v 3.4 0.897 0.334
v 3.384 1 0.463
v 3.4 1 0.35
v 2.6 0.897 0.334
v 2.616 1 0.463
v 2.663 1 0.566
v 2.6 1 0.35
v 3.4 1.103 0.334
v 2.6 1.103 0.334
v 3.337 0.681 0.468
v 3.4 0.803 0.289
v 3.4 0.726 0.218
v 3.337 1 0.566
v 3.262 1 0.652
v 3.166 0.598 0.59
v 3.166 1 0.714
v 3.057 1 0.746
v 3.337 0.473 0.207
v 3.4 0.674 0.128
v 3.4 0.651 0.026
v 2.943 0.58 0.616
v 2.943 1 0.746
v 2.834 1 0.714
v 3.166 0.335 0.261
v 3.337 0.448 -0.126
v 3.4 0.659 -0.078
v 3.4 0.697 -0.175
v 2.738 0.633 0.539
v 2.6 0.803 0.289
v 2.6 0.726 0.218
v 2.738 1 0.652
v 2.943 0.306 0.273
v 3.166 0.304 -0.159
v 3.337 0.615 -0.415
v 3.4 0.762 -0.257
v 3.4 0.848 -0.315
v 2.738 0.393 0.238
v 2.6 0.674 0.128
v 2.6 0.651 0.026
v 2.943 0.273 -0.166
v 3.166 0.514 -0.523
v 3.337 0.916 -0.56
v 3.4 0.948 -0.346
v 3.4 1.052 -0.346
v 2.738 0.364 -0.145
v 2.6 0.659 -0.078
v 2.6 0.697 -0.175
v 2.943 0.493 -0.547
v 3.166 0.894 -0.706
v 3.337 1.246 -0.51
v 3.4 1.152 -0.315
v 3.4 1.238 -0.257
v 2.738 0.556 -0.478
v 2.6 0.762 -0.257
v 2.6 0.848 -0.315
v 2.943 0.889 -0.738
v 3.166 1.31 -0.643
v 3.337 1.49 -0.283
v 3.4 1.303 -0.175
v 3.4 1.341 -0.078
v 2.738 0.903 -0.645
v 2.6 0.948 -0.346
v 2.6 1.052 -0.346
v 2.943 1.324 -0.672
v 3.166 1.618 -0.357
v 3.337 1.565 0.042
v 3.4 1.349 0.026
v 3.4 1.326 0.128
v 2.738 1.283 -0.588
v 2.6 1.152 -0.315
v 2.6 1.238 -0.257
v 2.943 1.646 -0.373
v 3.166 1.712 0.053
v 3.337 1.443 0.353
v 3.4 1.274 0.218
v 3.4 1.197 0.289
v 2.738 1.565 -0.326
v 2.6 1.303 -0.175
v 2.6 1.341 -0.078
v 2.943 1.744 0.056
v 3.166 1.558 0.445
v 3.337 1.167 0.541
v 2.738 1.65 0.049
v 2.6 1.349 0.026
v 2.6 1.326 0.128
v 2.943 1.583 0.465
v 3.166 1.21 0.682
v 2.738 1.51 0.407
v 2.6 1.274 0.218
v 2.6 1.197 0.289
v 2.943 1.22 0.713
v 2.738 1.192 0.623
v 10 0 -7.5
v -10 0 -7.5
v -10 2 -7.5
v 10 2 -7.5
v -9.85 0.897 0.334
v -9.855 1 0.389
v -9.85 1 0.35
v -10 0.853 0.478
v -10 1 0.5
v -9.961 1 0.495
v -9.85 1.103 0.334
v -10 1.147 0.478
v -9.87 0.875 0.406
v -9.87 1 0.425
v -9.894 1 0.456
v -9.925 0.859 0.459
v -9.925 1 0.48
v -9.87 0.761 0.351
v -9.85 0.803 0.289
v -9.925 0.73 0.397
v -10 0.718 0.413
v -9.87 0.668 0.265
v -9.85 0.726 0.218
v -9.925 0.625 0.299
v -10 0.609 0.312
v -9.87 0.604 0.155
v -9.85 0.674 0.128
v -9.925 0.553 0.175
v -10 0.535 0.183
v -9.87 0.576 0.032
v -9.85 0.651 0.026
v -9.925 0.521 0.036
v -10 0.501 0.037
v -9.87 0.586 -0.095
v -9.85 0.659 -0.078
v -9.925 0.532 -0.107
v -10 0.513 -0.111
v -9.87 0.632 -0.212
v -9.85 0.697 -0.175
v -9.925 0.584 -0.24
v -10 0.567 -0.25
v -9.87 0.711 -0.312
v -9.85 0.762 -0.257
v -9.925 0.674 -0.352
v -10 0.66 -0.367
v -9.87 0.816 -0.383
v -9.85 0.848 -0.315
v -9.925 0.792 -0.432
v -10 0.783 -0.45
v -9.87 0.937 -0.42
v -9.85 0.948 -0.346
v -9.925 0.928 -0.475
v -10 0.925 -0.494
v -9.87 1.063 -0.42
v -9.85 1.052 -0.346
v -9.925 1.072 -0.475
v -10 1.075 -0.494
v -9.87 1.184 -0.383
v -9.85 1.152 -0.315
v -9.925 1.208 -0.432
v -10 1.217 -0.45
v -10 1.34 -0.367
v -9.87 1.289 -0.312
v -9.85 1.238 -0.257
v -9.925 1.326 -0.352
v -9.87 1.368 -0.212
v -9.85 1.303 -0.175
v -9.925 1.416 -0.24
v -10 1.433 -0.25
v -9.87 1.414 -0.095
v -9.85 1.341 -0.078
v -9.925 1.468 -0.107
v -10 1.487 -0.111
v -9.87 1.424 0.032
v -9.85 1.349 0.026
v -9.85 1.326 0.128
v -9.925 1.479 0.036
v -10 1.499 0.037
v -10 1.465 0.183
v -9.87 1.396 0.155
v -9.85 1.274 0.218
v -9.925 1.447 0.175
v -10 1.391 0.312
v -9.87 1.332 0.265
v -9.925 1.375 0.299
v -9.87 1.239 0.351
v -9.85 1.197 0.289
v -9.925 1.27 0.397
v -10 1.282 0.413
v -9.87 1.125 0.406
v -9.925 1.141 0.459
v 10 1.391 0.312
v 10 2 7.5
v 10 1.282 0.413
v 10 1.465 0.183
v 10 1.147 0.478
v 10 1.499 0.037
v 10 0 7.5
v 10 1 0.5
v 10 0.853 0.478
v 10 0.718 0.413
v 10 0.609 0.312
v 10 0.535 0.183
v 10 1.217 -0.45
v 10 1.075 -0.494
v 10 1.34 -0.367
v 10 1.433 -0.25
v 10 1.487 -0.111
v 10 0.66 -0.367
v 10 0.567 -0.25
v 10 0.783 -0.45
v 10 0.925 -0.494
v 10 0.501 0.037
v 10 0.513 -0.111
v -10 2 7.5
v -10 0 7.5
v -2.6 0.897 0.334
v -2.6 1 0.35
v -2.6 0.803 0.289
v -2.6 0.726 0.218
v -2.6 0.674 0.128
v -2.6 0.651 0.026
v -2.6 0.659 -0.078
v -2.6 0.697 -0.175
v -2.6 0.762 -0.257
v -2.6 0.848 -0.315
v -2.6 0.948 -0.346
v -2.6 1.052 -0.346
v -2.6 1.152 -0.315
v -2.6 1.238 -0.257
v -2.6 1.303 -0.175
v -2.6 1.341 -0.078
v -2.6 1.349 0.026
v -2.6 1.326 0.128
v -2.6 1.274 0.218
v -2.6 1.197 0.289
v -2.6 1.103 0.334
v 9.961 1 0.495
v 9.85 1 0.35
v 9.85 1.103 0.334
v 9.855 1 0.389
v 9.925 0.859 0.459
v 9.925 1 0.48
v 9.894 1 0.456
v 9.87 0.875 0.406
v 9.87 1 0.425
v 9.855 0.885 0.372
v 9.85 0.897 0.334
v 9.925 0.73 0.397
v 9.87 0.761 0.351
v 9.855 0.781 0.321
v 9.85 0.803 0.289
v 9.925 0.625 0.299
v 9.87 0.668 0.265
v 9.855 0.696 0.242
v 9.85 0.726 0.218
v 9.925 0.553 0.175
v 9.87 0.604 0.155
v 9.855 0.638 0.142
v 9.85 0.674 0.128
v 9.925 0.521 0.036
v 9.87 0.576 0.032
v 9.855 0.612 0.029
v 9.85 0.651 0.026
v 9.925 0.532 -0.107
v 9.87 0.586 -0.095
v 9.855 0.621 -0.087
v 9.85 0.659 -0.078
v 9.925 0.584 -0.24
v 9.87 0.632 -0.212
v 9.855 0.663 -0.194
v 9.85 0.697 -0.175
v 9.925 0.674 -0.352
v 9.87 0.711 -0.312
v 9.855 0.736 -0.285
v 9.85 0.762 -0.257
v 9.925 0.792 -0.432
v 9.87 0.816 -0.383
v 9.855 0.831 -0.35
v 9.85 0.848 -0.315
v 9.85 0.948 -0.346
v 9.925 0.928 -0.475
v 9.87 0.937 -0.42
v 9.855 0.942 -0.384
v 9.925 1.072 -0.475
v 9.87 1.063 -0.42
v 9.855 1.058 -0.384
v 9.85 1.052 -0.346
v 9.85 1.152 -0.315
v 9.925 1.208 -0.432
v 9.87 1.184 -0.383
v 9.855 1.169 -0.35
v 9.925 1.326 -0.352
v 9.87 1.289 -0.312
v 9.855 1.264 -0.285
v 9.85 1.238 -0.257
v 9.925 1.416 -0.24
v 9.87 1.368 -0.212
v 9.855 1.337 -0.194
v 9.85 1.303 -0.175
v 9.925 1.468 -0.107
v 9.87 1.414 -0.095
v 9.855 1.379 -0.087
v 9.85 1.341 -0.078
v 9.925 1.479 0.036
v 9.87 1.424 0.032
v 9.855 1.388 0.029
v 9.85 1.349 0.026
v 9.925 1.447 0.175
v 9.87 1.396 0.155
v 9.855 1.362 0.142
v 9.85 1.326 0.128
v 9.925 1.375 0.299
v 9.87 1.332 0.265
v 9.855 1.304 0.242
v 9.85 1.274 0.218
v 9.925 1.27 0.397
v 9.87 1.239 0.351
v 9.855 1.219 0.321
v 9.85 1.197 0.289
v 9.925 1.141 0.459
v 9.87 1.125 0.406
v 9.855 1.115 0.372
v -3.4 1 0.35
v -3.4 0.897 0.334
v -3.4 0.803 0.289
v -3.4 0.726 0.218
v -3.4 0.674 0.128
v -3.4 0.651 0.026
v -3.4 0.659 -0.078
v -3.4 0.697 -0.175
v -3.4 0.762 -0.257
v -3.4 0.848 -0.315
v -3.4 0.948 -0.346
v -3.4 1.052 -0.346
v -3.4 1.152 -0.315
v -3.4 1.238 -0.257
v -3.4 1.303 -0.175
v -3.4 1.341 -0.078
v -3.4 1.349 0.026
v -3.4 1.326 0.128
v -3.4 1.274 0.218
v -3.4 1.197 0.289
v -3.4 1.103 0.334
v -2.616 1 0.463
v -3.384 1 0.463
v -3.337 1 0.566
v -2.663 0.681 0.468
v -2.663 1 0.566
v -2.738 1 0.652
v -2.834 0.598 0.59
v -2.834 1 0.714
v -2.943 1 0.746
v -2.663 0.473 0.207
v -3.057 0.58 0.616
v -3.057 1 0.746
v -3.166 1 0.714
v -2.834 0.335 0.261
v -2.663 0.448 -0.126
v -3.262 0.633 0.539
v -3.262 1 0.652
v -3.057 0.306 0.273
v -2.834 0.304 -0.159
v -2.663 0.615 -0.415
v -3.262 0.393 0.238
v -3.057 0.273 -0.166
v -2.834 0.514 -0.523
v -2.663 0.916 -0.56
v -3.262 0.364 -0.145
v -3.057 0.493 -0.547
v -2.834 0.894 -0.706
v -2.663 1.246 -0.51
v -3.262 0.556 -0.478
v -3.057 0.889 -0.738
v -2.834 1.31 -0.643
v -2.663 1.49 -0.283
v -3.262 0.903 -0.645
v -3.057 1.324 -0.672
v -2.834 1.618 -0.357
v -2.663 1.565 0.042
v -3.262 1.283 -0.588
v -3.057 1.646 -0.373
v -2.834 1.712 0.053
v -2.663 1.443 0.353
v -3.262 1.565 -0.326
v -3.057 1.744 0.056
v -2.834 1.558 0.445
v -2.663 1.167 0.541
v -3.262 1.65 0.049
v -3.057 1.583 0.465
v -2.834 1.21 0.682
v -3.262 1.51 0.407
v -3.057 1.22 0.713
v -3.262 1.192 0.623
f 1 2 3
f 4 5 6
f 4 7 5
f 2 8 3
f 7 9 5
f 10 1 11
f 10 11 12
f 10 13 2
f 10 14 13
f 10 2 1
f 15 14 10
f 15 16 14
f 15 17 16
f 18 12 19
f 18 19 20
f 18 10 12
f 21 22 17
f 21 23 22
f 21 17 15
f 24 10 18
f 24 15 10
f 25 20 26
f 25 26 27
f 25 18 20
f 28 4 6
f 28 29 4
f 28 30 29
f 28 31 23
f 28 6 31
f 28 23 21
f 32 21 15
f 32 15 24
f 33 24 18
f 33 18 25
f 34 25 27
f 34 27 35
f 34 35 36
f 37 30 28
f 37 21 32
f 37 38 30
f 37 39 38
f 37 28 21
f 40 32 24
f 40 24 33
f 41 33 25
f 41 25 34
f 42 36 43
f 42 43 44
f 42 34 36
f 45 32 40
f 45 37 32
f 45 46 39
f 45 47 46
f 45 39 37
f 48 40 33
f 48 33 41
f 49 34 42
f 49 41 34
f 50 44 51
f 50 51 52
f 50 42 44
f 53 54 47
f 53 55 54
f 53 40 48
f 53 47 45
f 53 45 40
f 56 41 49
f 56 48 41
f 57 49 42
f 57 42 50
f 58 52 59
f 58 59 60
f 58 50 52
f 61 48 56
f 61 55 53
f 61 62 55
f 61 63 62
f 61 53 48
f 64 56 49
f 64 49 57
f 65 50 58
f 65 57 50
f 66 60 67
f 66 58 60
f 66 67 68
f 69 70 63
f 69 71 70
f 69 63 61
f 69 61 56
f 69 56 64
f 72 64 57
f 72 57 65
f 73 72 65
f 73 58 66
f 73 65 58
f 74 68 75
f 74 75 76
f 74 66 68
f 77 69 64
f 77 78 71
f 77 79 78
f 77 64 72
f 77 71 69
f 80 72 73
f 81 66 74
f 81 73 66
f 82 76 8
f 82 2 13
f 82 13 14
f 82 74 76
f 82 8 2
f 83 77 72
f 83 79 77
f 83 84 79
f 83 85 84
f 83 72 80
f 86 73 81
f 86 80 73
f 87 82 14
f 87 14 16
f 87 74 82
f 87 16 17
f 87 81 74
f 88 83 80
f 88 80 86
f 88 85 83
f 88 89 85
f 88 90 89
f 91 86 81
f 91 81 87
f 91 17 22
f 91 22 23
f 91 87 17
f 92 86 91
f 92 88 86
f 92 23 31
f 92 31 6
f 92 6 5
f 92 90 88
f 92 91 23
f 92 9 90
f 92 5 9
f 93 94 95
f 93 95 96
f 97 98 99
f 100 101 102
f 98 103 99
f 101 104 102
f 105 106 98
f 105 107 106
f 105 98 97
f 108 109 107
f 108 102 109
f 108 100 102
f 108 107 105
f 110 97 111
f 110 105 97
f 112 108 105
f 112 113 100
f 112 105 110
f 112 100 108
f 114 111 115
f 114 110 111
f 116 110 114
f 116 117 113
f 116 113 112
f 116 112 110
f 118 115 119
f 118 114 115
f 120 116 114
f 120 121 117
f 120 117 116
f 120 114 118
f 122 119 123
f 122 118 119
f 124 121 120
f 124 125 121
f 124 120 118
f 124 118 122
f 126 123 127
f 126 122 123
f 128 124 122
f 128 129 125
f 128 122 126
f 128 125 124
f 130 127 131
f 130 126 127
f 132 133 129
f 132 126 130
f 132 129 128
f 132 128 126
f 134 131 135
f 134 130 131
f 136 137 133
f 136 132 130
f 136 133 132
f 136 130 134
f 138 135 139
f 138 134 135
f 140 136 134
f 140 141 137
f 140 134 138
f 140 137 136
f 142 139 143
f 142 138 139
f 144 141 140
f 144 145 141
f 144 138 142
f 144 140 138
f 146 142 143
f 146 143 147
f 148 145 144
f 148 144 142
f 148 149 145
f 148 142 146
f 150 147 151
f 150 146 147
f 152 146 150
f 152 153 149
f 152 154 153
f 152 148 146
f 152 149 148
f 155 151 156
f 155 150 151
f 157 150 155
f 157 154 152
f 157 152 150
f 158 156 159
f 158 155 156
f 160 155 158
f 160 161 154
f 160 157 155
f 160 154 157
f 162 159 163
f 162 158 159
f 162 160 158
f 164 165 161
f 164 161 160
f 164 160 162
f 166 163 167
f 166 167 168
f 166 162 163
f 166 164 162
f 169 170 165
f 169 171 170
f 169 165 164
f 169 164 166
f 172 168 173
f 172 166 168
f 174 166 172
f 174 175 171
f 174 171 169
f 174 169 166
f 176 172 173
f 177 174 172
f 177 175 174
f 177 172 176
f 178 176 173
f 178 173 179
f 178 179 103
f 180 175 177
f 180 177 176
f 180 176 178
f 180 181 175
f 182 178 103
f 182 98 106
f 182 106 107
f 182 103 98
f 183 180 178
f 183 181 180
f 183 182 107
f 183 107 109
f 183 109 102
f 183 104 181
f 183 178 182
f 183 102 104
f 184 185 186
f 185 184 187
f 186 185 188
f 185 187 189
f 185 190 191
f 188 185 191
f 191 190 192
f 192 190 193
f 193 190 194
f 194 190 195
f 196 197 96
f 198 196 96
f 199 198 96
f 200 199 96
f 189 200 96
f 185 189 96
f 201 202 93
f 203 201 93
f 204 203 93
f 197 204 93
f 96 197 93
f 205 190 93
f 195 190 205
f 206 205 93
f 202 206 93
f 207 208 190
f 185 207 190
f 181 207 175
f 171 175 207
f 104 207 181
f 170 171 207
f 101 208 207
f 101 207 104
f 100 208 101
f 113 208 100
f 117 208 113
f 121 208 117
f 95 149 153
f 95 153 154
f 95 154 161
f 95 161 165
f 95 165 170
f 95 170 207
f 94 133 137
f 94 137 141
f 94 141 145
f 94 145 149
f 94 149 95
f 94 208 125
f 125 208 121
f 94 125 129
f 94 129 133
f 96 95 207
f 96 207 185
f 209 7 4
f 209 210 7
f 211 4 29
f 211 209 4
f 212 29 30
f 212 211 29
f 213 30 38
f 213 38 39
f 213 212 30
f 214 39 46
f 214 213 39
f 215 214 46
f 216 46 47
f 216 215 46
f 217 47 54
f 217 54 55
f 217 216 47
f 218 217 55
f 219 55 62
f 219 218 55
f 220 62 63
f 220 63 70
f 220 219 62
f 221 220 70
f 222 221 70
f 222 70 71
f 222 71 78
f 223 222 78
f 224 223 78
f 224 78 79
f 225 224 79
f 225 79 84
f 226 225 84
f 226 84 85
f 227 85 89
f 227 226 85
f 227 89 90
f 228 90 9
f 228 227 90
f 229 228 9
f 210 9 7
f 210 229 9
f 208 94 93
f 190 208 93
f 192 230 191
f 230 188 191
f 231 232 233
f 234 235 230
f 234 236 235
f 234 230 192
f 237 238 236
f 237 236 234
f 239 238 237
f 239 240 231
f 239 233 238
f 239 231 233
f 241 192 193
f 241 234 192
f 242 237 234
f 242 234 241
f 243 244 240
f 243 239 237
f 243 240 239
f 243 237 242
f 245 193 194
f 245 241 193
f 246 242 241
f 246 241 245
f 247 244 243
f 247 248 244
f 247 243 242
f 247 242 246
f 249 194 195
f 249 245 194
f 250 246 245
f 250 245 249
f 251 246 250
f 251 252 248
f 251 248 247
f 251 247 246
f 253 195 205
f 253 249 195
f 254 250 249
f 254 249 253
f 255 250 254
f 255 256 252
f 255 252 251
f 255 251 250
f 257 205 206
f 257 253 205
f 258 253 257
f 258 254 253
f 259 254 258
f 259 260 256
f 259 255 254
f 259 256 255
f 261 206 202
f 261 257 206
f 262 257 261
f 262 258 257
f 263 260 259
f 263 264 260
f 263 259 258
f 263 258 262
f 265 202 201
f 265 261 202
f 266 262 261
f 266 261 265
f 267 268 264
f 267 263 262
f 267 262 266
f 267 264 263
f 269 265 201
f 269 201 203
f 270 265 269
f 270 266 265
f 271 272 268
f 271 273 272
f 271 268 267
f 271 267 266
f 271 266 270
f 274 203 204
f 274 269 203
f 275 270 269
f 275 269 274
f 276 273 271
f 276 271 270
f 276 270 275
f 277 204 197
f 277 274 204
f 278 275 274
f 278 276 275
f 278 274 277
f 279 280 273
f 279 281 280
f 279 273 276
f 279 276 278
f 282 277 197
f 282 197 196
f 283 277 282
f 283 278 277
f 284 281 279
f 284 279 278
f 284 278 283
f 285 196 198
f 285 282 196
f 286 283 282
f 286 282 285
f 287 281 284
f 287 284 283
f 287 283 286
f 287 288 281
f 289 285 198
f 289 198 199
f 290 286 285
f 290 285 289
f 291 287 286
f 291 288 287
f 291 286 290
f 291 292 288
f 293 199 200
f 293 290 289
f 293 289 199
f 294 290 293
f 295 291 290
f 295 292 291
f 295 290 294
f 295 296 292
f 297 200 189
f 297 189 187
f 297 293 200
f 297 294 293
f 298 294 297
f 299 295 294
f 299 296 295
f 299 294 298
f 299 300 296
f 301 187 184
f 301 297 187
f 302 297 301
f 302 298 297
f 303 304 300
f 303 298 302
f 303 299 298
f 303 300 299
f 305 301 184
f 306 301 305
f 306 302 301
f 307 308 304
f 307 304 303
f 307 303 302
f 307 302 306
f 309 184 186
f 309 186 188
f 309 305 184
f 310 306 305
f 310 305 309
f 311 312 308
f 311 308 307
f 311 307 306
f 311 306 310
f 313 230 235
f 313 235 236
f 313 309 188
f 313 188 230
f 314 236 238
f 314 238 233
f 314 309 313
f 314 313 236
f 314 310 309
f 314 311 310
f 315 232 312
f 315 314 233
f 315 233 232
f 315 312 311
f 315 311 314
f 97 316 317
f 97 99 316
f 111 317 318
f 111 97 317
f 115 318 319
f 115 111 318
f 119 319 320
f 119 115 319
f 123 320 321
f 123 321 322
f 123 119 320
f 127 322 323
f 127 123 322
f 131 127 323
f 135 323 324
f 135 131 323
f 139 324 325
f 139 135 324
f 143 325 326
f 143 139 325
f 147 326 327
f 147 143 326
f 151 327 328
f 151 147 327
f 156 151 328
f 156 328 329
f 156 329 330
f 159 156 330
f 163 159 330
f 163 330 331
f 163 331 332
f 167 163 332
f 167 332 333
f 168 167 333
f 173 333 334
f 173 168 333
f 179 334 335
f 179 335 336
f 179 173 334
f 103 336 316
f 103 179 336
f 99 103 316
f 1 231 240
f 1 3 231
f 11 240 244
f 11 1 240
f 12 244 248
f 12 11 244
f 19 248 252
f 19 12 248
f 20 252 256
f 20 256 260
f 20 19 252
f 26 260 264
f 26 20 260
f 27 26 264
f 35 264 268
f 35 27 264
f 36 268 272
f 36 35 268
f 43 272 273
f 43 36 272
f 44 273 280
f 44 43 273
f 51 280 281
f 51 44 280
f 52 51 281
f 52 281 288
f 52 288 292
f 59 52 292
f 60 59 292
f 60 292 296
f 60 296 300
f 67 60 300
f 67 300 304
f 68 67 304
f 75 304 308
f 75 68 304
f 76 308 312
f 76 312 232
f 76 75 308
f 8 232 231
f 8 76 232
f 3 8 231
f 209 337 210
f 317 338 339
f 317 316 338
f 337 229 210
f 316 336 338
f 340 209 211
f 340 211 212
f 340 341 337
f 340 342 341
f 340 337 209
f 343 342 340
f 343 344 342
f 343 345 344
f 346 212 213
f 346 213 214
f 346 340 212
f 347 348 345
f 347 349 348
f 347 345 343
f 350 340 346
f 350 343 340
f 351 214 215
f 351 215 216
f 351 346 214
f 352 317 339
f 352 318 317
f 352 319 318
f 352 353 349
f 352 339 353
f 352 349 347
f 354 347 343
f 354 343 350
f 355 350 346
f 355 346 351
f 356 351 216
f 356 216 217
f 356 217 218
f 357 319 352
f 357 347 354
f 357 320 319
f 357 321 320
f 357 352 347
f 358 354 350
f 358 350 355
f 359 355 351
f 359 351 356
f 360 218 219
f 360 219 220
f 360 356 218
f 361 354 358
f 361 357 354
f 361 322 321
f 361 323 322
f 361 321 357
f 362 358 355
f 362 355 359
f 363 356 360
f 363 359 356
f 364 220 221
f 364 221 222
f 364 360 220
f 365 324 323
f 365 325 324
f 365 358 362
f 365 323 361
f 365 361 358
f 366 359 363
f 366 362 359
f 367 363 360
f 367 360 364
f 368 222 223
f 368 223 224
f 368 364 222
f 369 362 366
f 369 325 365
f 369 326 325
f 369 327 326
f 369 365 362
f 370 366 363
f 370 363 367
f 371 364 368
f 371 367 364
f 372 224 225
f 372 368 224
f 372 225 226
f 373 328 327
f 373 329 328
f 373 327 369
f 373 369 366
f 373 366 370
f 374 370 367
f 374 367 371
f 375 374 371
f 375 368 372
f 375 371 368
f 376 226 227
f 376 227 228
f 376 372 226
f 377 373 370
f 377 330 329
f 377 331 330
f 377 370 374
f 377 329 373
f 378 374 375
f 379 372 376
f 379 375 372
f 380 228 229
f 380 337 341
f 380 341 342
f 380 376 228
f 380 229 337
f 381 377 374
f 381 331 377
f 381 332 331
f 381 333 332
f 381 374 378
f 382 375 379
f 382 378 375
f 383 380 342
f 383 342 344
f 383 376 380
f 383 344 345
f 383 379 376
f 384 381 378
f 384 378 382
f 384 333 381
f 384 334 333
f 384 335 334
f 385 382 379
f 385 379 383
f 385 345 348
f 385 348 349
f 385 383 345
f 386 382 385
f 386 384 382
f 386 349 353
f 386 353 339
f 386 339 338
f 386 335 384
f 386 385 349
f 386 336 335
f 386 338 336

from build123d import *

# Parameters (mm, degrees)
SKETCH1_W           = 20
SKETCH1_H           = 15
BOSS_EXTRUDE1_DEPTH = 2


with BuildPart() as part:
    # Sketch1 → Boss-Extrude1 (new body)
    with BuildSketch(Plane(origin=(0, 0, 0), x_dir=(1, 0, 0), z_dir=(0, 1, 0))):
        Rectangle(SKETCH1_W, SKETCH1_H)
    extrude(amount=BOSS_EXTRUDE1_DEPTH)

    # Sketch2 → Cut-Revolve1 (revolve, cut)
    with BuildSketch(Plane.XY, mode=Mode.PRIVATE) as cut_revolve1_sk:
        with BuildLine():
            Line((-10, 1), (10, 1))
            Line((10, 1), (10, 1.5))
            ThreePointArc((10, 1.5), (9.893933983, 1.456066017), (9.85, 1.35))
            Line((9.85, 1.35), (3.4, 1.35))
            ThreePointArc((3.4, 1.35), (3, 1.75), (2.6, 1.35))
            Line((2.6, 1.35), (-2.6, 1.35))
            ThreePointArc((-2.6, 1.35), (-3, 1.75), (-3.4, 1.35))
            Line((-3.4, 1.35), (-9.85, 1.35))
            ThreePointArc((-9.85, 1.35), (-9.893933983, 1.456066017), (-10, 1.5))
            Line((-10, 1.5), (-10, 1))
        make_face()
    revolve(cut_revolve1_sk.sketch.rotate(Axis((-10, 1, 0), (1, 0, 0)), 90), axis=Axis((-10, 1, 0), (1, 0, 0)), mode=Mode.SUBTRACT)


solid = part.part
